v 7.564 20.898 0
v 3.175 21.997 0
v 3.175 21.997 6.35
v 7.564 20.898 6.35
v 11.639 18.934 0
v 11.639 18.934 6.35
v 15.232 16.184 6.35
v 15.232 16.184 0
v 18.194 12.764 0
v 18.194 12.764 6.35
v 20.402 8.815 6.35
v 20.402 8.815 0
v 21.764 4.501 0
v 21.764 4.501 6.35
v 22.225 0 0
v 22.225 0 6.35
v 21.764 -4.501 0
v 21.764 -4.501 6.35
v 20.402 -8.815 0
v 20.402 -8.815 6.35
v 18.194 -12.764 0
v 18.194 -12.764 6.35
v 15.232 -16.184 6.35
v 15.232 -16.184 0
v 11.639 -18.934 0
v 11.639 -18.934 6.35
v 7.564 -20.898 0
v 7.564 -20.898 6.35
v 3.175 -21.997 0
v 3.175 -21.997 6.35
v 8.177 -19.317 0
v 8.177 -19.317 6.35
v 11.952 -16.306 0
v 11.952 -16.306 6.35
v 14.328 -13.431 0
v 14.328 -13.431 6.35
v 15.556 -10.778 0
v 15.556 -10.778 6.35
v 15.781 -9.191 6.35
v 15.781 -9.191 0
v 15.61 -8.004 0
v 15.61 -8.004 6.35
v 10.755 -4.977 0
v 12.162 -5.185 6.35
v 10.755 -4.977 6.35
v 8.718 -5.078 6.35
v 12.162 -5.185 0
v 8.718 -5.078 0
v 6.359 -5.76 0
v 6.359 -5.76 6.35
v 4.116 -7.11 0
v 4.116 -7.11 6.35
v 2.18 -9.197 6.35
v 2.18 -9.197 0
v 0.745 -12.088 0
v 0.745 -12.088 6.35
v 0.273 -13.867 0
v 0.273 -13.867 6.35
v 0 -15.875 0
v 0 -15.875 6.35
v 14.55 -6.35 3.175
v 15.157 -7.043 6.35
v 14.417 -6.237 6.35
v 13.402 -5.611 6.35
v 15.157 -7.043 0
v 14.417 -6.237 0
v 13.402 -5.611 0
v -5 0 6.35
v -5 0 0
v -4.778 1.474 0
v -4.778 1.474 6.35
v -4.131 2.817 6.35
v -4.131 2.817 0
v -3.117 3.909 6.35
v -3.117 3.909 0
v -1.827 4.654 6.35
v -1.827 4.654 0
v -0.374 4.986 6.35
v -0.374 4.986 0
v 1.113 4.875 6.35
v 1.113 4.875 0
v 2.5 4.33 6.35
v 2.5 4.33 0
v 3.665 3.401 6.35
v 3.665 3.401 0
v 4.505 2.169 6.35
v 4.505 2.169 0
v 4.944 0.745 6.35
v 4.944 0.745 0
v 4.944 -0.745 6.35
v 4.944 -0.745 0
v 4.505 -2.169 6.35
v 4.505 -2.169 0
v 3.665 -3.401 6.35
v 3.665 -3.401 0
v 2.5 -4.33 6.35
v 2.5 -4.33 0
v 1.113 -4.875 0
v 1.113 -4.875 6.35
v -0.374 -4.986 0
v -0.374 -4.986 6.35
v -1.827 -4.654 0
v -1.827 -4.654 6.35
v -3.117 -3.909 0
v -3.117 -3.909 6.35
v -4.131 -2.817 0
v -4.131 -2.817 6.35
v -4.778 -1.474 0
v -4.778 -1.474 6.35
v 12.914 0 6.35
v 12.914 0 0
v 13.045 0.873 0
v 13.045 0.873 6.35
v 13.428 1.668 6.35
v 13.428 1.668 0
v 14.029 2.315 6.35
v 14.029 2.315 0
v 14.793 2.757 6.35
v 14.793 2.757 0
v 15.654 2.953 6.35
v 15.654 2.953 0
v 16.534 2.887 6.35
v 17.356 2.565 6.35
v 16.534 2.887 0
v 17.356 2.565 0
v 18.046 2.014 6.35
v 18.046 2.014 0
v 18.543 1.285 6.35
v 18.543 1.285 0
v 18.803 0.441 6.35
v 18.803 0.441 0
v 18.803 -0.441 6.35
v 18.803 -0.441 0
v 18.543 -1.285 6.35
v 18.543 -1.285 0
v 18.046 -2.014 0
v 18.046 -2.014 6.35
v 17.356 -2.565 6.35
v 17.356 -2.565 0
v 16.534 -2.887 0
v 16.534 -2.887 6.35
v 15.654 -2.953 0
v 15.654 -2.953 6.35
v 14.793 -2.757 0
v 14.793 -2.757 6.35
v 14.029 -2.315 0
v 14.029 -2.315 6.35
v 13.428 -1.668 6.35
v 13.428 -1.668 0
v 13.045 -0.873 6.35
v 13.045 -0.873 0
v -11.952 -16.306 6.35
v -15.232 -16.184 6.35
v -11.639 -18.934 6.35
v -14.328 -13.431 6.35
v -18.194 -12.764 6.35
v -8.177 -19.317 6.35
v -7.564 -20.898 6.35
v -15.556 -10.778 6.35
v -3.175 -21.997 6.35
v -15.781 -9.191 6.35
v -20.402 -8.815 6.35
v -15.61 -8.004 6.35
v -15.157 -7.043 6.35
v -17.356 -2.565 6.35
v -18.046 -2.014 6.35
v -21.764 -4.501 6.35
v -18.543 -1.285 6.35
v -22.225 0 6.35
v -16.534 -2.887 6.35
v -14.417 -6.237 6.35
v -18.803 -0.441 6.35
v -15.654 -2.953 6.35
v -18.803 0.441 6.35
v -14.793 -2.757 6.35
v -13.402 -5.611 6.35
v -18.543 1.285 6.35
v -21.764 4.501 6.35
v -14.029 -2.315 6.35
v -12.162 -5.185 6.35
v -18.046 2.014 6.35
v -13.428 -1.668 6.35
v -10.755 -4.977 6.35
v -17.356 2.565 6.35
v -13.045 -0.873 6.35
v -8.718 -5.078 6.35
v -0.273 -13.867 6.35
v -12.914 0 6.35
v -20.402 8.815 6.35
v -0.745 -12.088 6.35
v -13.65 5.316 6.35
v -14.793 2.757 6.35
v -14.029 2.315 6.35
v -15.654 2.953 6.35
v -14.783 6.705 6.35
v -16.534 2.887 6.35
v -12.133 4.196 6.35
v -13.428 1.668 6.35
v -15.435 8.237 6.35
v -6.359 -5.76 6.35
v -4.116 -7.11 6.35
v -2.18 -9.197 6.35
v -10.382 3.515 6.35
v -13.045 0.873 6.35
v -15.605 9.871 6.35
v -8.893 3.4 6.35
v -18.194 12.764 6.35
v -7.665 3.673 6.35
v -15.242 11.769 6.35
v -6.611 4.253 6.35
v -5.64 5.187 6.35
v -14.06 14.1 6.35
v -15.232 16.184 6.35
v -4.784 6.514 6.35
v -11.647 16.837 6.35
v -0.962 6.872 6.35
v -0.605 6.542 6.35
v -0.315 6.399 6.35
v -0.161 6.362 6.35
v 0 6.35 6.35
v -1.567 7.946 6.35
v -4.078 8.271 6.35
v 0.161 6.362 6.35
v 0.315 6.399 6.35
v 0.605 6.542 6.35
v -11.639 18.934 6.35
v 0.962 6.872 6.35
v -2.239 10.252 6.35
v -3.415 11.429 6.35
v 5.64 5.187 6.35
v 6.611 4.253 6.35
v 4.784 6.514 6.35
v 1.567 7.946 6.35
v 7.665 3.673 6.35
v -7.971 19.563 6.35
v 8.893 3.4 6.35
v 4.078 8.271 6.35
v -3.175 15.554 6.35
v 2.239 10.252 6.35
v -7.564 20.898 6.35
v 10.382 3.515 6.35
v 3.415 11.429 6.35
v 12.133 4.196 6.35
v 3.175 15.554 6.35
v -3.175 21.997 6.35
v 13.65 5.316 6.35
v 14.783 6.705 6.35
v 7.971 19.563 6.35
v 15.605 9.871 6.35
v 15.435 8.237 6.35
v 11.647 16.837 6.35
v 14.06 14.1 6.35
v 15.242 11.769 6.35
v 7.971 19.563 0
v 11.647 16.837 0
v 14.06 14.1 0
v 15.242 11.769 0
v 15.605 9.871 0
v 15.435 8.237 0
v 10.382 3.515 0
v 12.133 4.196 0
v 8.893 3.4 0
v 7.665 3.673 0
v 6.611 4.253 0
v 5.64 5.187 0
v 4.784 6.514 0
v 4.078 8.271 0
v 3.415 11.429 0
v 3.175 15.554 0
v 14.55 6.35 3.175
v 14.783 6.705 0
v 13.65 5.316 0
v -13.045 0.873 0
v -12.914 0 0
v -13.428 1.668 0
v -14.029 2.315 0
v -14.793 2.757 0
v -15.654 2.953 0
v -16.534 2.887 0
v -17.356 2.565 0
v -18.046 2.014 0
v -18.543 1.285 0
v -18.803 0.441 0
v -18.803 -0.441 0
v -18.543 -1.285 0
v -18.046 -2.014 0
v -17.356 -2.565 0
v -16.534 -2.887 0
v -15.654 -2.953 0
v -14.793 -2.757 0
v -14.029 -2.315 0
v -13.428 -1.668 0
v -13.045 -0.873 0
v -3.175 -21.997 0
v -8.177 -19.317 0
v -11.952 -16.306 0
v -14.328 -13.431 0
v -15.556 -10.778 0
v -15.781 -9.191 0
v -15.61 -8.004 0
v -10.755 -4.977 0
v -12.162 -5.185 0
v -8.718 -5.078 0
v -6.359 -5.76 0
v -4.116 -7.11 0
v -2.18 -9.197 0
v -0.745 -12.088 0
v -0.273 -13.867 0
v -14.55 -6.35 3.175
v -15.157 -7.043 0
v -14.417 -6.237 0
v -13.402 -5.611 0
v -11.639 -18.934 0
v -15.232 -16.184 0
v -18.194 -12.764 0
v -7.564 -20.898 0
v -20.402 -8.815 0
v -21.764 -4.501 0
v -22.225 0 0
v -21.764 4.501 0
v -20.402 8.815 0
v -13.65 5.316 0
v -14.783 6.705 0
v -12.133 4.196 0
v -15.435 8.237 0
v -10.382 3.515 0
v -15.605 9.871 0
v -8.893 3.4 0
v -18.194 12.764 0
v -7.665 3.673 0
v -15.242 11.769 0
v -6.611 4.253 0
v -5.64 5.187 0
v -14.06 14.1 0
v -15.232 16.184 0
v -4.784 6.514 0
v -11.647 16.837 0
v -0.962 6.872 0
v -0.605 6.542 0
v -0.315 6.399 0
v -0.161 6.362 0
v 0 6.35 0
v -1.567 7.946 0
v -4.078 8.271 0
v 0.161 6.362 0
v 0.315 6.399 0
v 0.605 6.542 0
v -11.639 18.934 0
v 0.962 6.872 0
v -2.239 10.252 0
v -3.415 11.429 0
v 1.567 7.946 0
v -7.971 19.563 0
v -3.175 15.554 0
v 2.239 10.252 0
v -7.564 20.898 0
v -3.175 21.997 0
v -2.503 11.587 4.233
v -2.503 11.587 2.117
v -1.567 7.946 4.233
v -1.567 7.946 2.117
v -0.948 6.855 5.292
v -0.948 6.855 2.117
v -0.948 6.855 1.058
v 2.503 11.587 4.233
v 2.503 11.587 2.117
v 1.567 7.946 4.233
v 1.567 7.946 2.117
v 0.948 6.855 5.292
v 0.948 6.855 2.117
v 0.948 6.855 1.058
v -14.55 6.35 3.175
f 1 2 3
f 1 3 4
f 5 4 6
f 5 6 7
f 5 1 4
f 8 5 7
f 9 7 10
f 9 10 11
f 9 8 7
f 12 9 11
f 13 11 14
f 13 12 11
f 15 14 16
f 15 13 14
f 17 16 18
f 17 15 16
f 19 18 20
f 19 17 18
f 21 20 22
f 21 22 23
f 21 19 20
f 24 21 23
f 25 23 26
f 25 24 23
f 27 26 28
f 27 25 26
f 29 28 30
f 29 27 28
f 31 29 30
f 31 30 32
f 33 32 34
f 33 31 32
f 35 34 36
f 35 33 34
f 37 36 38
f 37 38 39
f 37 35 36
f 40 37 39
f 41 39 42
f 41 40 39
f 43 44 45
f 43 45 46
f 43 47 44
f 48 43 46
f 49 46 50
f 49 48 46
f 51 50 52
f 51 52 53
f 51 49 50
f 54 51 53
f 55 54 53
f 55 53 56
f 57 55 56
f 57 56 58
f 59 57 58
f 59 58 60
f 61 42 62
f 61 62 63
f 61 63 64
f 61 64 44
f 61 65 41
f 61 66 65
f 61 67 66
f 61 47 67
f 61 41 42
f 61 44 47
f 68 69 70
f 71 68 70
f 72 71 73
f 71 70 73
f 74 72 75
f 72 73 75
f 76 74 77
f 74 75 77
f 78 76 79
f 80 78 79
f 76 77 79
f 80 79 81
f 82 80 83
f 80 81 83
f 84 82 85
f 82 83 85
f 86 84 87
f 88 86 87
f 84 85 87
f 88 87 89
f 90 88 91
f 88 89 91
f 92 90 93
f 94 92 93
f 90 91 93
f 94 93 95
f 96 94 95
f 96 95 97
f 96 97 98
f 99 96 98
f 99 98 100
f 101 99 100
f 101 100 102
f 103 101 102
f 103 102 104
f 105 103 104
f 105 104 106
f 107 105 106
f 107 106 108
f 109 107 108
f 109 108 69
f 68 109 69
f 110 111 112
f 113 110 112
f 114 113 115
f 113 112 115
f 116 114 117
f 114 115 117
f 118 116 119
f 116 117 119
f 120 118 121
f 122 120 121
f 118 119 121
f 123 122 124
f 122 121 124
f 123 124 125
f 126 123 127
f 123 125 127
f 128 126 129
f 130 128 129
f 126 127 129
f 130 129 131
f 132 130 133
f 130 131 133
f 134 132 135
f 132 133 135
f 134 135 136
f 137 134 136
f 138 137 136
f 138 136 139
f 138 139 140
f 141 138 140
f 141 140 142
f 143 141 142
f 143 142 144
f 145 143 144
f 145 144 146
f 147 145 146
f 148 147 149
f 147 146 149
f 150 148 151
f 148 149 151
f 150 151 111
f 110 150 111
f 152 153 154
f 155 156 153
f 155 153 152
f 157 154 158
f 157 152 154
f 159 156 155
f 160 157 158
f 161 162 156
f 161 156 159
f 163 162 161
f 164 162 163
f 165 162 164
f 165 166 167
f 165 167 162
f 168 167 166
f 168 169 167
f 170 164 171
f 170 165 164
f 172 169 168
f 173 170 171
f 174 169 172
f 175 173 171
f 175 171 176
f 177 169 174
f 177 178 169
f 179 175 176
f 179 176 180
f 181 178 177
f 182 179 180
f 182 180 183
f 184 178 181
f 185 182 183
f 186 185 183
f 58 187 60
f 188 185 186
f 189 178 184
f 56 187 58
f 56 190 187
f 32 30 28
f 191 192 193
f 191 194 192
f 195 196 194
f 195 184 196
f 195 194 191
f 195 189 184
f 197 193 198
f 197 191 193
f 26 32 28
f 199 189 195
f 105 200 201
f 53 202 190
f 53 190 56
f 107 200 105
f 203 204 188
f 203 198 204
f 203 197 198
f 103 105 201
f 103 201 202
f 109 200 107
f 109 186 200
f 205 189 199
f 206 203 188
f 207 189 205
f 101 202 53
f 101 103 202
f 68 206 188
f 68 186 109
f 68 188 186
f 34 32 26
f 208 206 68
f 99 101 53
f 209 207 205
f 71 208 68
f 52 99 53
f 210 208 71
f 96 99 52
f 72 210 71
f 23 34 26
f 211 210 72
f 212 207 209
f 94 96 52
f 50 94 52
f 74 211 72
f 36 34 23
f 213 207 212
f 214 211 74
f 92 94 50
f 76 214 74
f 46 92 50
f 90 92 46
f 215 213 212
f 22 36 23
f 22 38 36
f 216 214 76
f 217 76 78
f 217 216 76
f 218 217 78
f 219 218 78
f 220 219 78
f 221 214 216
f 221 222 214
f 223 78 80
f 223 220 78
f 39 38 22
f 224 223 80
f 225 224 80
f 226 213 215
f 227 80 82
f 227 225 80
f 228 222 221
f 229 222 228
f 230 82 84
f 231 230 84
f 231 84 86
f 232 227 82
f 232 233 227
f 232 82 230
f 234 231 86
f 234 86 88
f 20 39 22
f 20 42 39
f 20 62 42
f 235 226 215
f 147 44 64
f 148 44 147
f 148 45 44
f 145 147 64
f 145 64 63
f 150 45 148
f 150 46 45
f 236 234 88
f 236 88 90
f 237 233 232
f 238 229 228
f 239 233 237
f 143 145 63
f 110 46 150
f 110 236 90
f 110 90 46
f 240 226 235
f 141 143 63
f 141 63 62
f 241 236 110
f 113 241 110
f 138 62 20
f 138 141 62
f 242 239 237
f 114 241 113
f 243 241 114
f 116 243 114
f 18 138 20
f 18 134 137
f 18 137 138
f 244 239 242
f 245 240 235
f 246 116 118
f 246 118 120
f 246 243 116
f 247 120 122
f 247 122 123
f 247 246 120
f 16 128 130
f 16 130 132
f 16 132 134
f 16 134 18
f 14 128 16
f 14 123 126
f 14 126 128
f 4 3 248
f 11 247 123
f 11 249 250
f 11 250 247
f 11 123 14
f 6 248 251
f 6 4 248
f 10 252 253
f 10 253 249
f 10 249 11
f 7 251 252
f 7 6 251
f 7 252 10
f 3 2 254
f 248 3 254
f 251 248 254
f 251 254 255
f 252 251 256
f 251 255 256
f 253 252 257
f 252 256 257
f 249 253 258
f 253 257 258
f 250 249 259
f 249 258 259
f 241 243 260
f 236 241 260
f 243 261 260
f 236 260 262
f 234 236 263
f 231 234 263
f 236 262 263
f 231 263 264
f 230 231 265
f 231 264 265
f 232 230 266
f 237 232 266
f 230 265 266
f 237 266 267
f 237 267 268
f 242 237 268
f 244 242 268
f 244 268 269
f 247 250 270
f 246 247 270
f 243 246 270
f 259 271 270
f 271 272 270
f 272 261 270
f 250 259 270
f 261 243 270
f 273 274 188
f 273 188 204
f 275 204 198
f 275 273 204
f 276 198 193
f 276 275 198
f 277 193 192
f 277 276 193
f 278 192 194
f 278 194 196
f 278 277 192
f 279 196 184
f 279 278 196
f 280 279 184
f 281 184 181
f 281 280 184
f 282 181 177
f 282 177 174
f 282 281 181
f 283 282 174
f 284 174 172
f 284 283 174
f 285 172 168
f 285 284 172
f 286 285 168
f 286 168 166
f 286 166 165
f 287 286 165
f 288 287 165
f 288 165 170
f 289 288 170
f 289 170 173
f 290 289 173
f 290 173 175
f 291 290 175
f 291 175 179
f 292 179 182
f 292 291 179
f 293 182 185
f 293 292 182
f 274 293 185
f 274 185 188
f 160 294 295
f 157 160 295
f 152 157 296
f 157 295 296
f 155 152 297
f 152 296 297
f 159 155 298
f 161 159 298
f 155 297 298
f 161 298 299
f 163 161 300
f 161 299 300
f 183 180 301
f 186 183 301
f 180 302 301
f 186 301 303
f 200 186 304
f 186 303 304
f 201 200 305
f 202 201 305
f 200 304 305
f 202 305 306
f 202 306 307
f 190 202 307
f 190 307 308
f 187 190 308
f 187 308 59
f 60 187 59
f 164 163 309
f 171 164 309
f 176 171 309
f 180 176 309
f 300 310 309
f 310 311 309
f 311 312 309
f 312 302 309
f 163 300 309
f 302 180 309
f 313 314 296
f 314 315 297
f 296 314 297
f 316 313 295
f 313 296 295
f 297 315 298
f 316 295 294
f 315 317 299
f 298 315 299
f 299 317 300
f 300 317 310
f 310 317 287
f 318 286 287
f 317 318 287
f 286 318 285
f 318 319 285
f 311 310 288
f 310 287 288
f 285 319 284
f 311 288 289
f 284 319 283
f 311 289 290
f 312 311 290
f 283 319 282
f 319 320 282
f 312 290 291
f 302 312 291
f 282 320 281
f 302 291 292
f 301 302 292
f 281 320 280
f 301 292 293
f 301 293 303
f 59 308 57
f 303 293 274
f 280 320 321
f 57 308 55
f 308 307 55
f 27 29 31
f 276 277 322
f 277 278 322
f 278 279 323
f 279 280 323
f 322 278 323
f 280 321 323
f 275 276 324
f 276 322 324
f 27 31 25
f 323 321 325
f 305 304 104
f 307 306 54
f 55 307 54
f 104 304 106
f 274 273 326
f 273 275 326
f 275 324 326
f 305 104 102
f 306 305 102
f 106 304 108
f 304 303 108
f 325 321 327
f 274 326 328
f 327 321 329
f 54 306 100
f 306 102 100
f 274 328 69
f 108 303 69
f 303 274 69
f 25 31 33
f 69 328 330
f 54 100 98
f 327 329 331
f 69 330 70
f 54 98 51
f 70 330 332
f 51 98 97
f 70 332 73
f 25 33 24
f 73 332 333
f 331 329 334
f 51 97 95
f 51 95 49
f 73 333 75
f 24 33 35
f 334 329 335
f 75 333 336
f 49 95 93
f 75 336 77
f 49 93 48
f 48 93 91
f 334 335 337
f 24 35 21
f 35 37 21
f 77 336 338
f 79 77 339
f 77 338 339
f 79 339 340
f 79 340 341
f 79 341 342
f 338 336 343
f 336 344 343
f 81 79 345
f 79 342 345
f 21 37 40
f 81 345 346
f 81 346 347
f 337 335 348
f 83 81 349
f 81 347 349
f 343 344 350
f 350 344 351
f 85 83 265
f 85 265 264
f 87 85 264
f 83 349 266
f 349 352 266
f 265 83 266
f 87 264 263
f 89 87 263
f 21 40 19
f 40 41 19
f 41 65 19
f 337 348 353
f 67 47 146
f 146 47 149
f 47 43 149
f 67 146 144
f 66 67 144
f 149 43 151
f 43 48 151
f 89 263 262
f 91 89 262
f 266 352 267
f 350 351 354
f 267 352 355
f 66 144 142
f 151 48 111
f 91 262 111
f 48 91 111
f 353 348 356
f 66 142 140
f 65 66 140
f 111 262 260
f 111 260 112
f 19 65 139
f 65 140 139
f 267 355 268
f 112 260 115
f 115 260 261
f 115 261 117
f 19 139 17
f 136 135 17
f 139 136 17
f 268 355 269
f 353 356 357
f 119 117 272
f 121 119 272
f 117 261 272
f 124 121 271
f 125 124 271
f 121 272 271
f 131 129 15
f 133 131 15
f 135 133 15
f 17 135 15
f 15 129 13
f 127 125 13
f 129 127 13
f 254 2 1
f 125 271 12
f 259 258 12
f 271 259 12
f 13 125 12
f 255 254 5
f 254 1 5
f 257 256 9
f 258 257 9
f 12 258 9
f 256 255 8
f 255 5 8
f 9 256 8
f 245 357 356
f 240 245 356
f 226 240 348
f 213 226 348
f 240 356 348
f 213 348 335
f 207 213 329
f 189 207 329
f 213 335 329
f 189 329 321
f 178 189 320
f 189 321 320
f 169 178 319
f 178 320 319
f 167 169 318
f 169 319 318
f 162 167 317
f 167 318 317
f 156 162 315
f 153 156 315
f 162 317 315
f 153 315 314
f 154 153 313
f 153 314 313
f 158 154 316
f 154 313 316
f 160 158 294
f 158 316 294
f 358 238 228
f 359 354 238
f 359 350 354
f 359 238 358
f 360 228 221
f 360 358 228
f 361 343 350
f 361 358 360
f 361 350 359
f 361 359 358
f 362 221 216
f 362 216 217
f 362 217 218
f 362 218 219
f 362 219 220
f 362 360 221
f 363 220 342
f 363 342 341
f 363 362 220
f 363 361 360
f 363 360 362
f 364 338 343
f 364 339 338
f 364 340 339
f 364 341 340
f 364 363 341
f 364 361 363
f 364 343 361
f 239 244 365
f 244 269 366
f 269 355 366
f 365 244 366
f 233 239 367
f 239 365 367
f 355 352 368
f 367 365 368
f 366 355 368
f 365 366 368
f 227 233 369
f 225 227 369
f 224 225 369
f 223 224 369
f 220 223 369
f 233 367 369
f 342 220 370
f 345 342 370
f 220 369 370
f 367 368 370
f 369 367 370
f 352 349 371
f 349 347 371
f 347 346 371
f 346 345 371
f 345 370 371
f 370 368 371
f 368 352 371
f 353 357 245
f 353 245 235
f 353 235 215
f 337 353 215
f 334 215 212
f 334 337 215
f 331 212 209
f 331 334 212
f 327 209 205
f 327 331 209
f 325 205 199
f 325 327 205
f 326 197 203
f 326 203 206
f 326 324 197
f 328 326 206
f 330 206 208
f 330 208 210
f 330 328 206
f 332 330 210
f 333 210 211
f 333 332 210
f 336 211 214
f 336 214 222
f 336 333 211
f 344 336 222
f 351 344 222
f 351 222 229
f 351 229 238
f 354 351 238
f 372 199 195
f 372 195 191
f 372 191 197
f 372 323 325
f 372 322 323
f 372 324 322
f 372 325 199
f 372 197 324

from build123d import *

# Parameters (mm, degrees)
F0_R     = 2.9614248249
F1_DEPTH = 6.35
F4_D     = 10


with BuildPart() as f1:
    # F0 (on Top) → F1 (new body)
    with BuildSketch(Plane.XY):
        with BuildLine():
            add(Edge.make_bspline(
                [(-3.175, 21.9970452561), (-13.4701055795, 17.6778641435), (-21.5584756618, 5.0746489519), (-3.175, 0), (-3.175, 15.5542598667)],
                knots=[0, 0, 0, 0, 0.5348418709, 1, 1, 1, 1], degree=3))
            ThreePointArc((-3.175, 21.9970452561), (-22.225, 0), (-3.175, -21.9970452561))
            add(Edge.make_bspline(
                [(-3.175, -21.9970452561), (-13.8975393501, -17.343846892), (-22.0709782387, -2.0584159269), (-0.8734419243, -4.604915157), (0, -15.875)],
                knots=[0, 0, 0, 0, 0.5133101899, 1, 1, 1, 1], degree=3))
            Line((0, -15.875), (0, 6.35))
            add(Edge.make_bspline(
                [(-3.175, 15.5542598667), (-2.5128191337, 11.9973989204), (-2.0055109635, 6.35), (0, 6.35)],
                knots=[0, 0, 0, 0, 9.7364790707, 9.7364790707, 9.7364790707, 9.7364790707], degree=3))
        make_face()
        with Locations((-15.875, 0)):
            Circle(F0_R, mode=Mode.SUBTRACT)
    extrude(amount=F1_DEPTH)

    # F2: F1 across face


with BuildPart() as f1_1:
    add(f1.part)
    add(f1.part.mirror(Plane(origin=(0, -4.7625, 3.175), x_dir=(0, 1, 0), z_dir=(1, 0, 0))))

    # F4 (through all)
    with Locations(Plane.XY.offset(6.35)):
        with Locations((0, 0)):
            Hole(F4_D / 2)


solid = f1_1.part
